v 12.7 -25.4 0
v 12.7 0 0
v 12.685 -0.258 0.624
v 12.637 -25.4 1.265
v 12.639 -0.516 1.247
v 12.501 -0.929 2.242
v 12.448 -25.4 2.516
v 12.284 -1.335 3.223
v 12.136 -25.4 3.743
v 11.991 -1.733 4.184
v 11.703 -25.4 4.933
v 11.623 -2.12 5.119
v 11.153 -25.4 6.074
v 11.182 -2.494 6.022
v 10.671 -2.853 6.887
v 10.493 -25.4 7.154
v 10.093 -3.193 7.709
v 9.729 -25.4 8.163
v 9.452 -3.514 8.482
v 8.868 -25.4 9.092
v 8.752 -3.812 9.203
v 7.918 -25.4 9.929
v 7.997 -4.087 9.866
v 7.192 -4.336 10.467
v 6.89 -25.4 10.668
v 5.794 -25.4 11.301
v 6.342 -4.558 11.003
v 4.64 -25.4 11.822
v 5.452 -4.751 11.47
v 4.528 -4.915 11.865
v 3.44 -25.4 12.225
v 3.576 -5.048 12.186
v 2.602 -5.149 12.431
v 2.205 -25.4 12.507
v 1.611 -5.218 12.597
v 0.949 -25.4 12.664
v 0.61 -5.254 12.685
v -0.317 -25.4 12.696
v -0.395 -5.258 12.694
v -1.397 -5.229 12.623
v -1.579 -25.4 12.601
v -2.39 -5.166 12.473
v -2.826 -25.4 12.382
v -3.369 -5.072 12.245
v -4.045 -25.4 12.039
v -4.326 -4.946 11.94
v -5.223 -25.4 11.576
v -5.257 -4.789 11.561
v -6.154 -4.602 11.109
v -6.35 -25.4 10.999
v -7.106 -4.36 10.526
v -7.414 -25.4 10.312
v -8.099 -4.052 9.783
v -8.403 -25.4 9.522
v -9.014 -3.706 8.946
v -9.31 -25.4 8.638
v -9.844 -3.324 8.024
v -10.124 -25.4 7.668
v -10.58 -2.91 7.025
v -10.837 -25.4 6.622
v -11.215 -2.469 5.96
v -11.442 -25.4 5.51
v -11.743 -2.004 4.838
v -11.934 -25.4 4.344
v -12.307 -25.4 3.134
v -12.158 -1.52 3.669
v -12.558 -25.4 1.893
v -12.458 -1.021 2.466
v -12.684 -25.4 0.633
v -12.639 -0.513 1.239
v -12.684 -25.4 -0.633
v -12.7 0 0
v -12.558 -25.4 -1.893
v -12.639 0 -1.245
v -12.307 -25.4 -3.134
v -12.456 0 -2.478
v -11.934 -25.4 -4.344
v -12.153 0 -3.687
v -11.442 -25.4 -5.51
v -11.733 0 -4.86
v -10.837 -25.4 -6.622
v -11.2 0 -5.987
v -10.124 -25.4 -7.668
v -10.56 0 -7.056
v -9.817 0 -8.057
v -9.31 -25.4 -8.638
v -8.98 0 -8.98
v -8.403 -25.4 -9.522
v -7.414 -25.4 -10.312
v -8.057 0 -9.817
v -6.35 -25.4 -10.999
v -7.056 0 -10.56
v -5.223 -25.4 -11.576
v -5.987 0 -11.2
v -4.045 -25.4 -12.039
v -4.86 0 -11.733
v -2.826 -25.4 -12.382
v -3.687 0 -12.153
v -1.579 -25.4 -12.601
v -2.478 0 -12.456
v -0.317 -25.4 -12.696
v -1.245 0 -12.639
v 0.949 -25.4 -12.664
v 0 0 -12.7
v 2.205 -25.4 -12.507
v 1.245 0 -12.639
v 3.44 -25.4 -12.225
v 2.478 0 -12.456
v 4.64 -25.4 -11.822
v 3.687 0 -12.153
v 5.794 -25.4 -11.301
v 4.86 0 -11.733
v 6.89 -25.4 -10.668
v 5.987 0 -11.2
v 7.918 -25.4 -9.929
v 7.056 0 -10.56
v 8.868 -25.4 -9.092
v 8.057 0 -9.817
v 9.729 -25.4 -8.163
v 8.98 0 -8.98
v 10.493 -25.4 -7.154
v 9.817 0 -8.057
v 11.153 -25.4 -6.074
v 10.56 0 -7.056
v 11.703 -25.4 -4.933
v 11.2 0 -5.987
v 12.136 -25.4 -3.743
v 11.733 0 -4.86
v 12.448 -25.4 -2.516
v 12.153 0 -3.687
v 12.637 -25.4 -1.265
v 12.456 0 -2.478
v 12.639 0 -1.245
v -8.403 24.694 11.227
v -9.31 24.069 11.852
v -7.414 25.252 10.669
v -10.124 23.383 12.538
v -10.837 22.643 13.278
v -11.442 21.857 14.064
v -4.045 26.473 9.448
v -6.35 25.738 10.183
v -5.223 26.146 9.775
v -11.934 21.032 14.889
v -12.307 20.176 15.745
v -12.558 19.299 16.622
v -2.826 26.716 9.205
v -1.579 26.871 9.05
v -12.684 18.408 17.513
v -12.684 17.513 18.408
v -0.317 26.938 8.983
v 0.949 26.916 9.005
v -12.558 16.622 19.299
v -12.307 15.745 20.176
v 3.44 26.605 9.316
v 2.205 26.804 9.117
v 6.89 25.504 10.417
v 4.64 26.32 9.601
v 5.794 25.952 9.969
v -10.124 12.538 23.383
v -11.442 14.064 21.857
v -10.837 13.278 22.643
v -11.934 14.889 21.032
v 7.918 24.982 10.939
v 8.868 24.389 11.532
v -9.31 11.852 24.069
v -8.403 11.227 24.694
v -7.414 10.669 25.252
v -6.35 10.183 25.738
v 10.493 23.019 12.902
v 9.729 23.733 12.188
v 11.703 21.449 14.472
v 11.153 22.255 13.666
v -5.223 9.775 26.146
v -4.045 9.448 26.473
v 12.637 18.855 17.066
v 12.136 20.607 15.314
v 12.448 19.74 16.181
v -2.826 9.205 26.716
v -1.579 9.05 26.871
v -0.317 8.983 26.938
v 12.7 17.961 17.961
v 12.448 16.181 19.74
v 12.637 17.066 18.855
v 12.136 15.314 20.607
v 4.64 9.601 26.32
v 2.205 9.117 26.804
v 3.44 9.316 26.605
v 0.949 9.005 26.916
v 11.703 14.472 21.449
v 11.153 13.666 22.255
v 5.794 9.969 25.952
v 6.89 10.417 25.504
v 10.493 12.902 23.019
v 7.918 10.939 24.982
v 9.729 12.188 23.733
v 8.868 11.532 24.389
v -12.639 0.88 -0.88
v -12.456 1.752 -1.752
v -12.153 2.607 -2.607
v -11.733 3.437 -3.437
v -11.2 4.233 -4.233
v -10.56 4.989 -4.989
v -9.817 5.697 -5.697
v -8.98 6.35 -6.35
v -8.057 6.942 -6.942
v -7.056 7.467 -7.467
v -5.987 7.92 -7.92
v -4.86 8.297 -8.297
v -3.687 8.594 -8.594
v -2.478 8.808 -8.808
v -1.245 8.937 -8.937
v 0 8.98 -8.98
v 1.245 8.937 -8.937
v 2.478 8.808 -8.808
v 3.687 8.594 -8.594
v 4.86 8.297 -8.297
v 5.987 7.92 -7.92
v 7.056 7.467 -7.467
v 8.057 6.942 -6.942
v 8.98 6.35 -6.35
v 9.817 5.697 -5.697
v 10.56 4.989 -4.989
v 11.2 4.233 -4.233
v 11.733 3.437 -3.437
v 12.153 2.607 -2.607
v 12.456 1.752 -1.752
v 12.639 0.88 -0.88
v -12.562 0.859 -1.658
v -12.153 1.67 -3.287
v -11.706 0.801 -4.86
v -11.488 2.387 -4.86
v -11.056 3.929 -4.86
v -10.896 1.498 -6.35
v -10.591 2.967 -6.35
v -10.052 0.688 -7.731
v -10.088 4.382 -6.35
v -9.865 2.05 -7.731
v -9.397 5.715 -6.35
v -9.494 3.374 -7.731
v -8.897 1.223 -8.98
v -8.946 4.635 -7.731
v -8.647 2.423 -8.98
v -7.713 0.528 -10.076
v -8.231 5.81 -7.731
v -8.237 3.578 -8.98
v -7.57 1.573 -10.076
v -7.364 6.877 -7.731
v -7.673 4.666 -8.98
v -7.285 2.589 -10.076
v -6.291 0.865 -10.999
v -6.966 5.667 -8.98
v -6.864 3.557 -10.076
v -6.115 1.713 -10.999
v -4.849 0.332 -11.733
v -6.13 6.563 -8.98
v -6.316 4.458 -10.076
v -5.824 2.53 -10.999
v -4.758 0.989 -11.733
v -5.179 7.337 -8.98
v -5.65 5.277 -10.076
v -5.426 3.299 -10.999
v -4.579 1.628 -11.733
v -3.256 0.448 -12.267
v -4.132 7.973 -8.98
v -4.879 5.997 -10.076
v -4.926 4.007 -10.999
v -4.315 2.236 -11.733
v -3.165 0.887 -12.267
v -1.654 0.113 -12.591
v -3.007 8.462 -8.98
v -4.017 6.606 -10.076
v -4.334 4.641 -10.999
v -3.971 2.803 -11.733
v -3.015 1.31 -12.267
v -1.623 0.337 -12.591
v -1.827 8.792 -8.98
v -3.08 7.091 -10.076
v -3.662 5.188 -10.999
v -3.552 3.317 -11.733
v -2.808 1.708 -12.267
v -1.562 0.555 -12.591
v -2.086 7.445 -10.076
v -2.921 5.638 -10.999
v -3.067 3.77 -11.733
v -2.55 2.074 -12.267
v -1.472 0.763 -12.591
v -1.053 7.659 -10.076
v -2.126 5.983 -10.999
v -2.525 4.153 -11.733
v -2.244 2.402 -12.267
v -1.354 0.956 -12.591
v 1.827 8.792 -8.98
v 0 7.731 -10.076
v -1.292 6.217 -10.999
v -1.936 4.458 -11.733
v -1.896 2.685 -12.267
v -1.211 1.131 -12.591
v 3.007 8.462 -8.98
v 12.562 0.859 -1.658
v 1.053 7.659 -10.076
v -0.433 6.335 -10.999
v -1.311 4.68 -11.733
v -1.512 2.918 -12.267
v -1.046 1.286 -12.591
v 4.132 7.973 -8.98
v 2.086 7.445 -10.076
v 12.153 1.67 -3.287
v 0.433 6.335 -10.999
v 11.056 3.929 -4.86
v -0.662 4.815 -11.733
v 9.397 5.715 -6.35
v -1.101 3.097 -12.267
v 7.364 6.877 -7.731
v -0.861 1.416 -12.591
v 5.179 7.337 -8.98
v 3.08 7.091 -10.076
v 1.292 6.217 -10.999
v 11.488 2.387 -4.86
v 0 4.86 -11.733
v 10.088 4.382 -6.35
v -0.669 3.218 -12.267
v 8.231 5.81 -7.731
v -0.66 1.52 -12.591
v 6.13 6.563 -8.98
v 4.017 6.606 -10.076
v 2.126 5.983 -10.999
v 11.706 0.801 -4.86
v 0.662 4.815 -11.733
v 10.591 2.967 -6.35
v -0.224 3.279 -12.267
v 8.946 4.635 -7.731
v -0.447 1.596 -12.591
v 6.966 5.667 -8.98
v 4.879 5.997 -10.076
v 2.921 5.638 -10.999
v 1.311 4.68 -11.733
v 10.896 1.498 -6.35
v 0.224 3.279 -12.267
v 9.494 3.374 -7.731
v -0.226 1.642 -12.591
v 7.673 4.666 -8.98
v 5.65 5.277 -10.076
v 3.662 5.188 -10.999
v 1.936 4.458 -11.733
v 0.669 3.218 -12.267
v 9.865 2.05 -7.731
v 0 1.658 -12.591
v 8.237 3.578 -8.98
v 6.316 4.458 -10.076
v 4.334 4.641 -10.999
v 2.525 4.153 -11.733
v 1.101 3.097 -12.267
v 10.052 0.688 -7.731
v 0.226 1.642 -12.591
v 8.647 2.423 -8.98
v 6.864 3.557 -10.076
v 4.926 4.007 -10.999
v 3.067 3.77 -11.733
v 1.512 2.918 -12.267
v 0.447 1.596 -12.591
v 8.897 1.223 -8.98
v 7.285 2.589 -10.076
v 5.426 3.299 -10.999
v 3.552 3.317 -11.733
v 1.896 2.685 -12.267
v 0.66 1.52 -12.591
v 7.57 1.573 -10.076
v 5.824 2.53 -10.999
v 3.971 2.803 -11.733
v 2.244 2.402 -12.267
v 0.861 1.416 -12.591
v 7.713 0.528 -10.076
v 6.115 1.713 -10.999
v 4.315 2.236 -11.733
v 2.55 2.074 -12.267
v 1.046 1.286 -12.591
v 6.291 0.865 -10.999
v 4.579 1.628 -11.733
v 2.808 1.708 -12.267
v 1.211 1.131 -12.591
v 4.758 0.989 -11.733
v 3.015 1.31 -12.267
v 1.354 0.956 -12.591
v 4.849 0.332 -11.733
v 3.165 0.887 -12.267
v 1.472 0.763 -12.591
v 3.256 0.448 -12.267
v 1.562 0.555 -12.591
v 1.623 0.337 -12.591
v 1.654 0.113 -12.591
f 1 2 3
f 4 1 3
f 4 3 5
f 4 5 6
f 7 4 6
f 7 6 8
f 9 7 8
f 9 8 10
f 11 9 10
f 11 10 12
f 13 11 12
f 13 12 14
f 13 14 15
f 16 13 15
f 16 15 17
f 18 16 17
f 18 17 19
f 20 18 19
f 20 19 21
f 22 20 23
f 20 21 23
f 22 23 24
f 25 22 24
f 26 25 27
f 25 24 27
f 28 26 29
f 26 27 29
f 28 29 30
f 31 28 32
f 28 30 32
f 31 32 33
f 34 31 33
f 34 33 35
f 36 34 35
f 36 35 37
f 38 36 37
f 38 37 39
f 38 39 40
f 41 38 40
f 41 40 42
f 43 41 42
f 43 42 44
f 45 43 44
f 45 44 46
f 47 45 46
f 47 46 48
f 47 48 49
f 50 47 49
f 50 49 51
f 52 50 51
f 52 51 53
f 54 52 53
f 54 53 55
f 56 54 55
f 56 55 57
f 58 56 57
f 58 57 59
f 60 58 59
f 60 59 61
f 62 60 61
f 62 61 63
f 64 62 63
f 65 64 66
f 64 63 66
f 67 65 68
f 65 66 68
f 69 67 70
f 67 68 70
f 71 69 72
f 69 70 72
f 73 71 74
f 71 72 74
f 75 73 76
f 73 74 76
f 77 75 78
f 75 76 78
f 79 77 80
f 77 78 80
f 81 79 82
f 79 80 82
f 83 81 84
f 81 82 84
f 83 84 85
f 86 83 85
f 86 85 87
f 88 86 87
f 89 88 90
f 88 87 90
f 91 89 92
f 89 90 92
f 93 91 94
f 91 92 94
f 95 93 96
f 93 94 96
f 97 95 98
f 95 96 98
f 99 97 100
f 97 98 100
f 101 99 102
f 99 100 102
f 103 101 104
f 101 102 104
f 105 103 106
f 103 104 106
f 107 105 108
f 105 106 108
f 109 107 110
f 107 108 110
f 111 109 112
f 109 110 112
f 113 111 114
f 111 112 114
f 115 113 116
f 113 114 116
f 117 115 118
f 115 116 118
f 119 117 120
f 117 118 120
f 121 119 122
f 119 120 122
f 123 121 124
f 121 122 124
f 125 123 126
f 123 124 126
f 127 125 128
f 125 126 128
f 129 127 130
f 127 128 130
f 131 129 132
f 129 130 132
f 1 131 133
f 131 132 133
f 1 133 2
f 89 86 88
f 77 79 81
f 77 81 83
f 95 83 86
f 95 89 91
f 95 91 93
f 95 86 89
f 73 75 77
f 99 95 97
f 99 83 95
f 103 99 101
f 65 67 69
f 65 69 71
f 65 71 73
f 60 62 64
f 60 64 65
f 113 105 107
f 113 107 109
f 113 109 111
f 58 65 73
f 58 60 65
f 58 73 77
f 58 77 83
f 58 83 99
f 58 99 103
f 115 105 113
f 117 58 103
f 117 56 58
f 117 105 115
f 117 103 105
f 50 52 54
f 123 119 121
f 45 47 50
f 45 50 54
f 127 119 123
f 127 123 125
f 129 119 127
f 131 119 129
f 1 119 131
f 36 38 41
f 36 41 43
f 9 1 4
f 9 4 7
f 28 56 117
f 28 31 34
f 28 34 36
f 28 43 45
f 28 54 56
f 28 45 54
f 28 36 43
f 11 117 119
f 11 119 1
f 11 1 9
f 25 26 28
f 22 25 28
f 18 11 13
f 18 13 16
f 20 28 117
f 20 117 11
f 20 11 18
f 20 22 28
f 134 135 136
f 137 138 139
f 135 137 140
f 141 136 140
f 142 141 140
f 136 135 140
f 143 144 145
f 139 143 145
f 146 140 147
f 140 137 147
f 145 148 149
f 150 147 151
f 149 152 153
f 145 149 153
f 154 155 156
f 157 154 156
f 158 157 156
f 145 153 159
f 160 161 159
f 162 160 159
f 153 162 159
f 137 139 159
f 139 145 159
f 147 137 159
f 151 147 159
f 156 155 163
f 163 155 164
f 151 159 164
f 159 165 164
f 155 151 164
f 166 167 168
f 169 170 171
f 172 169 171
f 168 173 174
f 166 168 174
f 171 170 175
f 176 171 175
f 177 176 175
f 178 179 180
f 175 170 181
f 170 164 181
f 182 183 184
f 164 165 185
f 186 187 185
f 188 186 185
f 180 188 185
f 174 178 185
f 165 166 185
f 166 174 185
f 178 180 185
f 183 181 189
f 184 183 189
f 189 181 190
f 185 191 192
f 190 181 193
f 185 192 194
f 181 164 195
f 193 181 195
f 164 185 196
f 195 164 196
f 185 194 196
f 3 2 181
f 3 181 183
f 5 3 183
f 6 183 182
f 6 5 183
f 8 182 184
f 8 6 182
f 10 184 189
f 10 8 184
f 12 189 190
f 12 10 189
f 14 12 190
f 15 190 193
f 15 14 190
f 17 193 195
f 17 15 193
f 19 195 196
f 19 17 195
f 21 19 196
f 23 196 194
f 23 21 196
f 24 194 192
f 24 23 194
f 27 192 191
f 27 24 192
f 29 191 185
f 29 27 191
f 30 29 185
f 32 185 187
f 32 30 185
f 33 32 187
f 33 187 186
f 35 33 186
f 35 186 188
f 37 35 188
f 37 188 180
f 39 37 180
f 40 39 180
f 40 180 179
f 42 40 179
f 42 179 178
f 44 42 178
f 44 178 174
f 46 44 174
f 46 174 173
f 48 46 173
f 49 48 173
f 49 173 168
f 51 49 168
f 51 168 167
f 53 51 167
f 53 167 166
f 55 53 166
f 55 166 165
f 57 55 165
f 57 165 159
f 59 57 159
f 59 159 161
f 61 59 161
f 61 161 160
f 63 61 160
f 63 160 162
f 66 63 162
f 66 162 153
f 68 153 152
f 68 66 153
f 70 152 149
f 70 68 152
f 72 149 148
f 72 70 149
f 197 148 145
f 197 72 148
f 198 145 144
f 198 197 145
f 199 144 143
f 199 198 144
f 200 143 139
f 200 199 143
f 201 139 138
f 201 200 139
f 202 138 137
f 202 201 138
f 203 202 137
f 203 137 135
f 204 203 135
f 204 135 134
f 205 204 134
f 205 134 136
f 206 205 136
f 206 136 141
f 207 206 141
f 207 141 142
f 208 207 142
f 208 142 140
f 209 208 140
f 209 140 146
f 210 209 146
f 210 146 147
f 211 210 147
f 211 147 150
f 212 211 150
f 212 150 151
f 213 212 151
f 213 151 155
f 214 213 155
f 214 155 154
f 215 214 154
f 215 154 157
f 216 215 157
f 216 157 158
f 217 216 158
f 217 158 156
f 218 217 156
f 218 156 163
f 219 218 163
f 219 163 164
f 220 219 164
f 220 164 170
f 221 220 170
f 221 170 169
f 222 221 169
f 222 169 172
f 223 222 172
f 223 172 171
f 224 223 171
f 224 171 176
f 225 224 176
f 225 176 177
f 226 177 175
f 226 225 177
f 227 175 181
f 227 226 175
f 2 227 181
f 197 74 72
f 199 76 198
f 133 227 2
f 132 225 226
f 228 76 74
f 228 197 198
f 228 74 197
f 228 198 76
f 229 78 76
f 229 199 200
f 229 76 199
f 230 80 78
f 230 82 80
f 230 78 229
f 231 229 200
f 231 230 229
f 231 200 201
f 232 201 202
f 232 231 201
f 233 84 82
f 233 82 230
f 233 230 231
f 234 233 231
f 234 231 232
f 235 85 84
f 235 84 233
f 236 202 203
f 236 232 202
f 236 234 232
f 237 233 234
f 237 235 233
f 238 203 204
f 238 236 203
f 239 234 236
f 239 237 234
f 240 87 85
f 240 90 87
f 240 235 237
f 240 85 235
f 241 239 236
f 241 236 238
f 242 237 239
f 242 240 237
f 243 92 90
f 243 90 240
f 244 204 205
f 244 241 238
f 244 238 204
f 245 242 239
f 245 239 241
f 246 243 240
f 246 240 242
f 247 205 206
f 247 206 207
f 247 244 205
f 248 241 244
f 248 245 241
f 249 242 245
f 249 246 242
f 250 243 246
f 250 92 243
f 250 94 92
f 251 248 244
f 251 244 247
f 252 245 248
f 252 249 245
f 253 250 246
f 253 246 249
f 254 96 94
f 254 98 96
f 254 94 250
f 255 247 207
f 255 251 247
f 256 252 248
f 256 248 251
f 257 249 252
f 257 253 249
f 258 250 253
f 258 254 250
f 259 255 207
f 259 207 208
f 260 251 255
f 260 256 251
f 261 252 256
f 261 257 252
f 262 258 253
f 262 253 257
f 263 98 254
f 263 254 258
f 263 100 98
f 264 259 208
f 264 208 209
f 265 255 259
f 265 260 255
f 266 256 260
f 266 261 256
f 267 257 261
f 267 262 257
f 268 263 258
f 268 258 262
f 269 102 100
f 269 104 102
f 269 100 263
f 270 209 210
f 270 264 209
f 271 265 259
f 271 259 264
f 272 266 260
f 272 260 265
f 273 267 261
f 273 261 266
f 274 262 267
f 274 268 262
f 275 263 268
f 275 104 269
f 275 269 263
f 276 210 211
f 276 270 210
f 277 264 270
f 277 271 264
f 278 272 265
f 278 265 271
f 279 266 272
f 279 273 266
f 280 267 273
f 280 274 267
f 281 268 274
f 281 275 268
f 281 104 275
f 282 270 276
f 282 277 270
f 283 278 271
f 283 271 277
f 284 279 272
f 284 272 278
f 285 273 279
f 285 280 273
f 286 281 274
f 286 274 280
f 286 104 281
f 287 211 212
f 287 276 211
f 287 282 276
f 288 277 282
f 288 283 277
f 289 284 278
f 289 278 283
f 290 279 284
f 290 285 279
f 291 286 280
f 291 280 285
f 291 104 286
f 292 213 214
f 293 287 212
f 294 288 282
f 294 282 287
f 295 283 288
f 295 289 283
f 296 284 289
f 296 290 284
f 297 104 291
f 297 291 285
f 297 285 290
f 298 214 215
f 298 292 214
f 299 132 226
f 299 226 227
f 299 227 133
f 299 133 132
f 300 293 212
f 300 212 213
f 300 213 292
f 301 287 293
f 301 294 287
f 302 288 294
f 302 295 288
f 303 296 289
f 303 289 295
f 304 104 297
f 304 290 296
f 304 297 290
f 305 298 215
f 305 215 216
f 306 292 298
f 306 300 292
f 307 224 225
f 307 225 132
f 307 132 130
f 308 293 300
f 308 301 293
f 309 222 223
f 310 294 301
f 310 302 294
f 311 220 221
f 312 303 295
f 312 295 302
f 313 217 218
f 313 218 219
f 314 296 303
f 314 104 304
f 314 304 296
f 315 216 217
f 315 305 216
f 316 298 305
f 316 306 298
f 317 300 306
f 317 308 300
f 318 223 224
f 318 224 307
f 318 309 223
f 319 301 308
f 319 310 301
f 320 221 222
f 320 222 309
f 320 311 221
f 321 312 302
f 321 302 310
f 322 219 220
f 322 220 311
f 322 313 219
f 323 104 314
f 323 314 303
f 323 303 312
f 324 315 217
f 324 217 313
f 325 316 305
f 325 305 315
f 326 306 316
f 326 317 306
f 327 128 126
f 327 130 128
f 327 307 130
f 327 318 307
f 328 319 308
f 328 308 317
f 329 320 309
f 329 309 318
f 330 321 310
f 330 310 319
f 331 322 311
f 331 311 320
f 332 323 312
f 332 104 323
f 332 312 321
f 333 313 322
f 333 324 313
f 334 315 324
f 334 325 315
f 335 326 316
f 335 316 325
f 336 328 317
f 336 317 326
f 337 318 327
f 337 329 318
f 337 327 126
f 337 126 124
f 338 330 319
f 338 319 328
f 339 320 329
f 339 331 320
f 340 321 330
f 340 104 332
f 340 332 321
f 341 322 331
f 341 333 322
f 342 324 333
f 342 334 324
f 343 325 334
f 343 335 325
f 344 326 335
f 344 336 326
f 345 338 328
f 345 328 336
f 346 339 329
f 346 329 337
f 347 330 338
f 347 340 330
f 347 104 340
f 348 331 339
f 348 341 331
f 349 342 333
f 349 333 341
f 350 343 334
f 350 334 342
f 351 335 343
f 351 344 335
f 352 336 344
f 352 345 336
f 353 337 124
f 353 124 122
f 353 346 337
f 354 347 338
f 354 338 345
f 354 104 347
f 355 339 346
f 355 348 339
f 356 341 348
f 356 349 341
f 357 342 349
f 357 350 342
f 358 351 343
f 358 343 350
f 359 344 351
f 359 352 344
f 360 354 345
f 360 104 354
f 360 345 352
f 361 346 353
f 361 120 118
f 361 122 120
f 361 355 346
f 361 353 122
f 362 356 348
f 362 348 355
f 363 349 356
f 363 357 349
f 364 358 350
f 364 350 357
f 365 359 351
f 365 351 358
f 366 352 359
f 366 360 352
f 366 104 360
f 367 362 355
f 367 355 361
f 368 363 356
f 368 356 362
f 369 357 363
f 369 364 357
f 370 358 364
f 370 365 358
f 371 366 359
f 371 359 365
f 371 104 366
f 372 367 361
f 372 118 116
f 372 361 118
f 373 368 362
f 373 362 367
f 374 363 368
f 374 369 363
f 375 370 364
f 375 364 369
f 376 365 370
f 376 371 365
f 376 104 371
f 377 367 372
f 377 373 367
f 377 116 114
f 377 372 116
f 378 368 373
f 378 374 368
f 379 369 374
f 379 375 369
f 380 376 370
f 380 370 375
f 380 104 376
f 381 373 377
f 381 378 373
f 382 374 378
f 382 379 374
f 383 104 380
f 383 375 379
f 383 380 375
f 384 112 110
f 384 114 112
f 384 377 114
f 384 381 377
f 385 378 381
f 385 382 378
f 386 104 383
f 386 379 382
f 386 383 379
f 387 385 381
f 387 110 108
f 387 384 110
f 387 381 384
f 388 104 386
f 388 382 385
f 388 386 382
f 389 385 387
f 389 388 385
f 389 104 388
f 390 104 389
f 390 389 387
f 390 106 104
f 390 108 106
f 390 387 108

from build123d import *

# Parameters (mm, degrees)
F5_R     = 12.7
F6_DEPTH = 25.4


# Not quite as in the source:
# - a feature of the source that left no trace in its solid (it failed there, or was rolled back) is left out
# - a pattern or mirror of a feature is missing from the dataset's text; its kind, count and spacing are read off the source's solid


with BuildPart() as f4:
    # F3 (on Right) → F4 (revolve)
    with BuildSketch(Plane.YZ):
        with BuildLine():
            Line((0, -12.7), (0, 12.7))
            ThreePointArc((0, 12.7), (-12.7, 0), (0, -12.7))
        make_face()
    revolve(axis=Axis((0, 0, -2.0618988201), (0, 0, -1)))

    # F5 (on Front) → F6 (join)
    with BuildSketch(Plane.XZ):
        Circle(F5_R)
    f6 = extrude(amount=F6_DEPTH)

    # F6_copies: F6 across plane
    add(f6.mirror(Plane(origin=(0, 0, 0), x_dir=(0, -0.3826834324, 0.9238795325), z_dir=(0, 0.9238795325, 0.3826834324))))


solid = f4.part
